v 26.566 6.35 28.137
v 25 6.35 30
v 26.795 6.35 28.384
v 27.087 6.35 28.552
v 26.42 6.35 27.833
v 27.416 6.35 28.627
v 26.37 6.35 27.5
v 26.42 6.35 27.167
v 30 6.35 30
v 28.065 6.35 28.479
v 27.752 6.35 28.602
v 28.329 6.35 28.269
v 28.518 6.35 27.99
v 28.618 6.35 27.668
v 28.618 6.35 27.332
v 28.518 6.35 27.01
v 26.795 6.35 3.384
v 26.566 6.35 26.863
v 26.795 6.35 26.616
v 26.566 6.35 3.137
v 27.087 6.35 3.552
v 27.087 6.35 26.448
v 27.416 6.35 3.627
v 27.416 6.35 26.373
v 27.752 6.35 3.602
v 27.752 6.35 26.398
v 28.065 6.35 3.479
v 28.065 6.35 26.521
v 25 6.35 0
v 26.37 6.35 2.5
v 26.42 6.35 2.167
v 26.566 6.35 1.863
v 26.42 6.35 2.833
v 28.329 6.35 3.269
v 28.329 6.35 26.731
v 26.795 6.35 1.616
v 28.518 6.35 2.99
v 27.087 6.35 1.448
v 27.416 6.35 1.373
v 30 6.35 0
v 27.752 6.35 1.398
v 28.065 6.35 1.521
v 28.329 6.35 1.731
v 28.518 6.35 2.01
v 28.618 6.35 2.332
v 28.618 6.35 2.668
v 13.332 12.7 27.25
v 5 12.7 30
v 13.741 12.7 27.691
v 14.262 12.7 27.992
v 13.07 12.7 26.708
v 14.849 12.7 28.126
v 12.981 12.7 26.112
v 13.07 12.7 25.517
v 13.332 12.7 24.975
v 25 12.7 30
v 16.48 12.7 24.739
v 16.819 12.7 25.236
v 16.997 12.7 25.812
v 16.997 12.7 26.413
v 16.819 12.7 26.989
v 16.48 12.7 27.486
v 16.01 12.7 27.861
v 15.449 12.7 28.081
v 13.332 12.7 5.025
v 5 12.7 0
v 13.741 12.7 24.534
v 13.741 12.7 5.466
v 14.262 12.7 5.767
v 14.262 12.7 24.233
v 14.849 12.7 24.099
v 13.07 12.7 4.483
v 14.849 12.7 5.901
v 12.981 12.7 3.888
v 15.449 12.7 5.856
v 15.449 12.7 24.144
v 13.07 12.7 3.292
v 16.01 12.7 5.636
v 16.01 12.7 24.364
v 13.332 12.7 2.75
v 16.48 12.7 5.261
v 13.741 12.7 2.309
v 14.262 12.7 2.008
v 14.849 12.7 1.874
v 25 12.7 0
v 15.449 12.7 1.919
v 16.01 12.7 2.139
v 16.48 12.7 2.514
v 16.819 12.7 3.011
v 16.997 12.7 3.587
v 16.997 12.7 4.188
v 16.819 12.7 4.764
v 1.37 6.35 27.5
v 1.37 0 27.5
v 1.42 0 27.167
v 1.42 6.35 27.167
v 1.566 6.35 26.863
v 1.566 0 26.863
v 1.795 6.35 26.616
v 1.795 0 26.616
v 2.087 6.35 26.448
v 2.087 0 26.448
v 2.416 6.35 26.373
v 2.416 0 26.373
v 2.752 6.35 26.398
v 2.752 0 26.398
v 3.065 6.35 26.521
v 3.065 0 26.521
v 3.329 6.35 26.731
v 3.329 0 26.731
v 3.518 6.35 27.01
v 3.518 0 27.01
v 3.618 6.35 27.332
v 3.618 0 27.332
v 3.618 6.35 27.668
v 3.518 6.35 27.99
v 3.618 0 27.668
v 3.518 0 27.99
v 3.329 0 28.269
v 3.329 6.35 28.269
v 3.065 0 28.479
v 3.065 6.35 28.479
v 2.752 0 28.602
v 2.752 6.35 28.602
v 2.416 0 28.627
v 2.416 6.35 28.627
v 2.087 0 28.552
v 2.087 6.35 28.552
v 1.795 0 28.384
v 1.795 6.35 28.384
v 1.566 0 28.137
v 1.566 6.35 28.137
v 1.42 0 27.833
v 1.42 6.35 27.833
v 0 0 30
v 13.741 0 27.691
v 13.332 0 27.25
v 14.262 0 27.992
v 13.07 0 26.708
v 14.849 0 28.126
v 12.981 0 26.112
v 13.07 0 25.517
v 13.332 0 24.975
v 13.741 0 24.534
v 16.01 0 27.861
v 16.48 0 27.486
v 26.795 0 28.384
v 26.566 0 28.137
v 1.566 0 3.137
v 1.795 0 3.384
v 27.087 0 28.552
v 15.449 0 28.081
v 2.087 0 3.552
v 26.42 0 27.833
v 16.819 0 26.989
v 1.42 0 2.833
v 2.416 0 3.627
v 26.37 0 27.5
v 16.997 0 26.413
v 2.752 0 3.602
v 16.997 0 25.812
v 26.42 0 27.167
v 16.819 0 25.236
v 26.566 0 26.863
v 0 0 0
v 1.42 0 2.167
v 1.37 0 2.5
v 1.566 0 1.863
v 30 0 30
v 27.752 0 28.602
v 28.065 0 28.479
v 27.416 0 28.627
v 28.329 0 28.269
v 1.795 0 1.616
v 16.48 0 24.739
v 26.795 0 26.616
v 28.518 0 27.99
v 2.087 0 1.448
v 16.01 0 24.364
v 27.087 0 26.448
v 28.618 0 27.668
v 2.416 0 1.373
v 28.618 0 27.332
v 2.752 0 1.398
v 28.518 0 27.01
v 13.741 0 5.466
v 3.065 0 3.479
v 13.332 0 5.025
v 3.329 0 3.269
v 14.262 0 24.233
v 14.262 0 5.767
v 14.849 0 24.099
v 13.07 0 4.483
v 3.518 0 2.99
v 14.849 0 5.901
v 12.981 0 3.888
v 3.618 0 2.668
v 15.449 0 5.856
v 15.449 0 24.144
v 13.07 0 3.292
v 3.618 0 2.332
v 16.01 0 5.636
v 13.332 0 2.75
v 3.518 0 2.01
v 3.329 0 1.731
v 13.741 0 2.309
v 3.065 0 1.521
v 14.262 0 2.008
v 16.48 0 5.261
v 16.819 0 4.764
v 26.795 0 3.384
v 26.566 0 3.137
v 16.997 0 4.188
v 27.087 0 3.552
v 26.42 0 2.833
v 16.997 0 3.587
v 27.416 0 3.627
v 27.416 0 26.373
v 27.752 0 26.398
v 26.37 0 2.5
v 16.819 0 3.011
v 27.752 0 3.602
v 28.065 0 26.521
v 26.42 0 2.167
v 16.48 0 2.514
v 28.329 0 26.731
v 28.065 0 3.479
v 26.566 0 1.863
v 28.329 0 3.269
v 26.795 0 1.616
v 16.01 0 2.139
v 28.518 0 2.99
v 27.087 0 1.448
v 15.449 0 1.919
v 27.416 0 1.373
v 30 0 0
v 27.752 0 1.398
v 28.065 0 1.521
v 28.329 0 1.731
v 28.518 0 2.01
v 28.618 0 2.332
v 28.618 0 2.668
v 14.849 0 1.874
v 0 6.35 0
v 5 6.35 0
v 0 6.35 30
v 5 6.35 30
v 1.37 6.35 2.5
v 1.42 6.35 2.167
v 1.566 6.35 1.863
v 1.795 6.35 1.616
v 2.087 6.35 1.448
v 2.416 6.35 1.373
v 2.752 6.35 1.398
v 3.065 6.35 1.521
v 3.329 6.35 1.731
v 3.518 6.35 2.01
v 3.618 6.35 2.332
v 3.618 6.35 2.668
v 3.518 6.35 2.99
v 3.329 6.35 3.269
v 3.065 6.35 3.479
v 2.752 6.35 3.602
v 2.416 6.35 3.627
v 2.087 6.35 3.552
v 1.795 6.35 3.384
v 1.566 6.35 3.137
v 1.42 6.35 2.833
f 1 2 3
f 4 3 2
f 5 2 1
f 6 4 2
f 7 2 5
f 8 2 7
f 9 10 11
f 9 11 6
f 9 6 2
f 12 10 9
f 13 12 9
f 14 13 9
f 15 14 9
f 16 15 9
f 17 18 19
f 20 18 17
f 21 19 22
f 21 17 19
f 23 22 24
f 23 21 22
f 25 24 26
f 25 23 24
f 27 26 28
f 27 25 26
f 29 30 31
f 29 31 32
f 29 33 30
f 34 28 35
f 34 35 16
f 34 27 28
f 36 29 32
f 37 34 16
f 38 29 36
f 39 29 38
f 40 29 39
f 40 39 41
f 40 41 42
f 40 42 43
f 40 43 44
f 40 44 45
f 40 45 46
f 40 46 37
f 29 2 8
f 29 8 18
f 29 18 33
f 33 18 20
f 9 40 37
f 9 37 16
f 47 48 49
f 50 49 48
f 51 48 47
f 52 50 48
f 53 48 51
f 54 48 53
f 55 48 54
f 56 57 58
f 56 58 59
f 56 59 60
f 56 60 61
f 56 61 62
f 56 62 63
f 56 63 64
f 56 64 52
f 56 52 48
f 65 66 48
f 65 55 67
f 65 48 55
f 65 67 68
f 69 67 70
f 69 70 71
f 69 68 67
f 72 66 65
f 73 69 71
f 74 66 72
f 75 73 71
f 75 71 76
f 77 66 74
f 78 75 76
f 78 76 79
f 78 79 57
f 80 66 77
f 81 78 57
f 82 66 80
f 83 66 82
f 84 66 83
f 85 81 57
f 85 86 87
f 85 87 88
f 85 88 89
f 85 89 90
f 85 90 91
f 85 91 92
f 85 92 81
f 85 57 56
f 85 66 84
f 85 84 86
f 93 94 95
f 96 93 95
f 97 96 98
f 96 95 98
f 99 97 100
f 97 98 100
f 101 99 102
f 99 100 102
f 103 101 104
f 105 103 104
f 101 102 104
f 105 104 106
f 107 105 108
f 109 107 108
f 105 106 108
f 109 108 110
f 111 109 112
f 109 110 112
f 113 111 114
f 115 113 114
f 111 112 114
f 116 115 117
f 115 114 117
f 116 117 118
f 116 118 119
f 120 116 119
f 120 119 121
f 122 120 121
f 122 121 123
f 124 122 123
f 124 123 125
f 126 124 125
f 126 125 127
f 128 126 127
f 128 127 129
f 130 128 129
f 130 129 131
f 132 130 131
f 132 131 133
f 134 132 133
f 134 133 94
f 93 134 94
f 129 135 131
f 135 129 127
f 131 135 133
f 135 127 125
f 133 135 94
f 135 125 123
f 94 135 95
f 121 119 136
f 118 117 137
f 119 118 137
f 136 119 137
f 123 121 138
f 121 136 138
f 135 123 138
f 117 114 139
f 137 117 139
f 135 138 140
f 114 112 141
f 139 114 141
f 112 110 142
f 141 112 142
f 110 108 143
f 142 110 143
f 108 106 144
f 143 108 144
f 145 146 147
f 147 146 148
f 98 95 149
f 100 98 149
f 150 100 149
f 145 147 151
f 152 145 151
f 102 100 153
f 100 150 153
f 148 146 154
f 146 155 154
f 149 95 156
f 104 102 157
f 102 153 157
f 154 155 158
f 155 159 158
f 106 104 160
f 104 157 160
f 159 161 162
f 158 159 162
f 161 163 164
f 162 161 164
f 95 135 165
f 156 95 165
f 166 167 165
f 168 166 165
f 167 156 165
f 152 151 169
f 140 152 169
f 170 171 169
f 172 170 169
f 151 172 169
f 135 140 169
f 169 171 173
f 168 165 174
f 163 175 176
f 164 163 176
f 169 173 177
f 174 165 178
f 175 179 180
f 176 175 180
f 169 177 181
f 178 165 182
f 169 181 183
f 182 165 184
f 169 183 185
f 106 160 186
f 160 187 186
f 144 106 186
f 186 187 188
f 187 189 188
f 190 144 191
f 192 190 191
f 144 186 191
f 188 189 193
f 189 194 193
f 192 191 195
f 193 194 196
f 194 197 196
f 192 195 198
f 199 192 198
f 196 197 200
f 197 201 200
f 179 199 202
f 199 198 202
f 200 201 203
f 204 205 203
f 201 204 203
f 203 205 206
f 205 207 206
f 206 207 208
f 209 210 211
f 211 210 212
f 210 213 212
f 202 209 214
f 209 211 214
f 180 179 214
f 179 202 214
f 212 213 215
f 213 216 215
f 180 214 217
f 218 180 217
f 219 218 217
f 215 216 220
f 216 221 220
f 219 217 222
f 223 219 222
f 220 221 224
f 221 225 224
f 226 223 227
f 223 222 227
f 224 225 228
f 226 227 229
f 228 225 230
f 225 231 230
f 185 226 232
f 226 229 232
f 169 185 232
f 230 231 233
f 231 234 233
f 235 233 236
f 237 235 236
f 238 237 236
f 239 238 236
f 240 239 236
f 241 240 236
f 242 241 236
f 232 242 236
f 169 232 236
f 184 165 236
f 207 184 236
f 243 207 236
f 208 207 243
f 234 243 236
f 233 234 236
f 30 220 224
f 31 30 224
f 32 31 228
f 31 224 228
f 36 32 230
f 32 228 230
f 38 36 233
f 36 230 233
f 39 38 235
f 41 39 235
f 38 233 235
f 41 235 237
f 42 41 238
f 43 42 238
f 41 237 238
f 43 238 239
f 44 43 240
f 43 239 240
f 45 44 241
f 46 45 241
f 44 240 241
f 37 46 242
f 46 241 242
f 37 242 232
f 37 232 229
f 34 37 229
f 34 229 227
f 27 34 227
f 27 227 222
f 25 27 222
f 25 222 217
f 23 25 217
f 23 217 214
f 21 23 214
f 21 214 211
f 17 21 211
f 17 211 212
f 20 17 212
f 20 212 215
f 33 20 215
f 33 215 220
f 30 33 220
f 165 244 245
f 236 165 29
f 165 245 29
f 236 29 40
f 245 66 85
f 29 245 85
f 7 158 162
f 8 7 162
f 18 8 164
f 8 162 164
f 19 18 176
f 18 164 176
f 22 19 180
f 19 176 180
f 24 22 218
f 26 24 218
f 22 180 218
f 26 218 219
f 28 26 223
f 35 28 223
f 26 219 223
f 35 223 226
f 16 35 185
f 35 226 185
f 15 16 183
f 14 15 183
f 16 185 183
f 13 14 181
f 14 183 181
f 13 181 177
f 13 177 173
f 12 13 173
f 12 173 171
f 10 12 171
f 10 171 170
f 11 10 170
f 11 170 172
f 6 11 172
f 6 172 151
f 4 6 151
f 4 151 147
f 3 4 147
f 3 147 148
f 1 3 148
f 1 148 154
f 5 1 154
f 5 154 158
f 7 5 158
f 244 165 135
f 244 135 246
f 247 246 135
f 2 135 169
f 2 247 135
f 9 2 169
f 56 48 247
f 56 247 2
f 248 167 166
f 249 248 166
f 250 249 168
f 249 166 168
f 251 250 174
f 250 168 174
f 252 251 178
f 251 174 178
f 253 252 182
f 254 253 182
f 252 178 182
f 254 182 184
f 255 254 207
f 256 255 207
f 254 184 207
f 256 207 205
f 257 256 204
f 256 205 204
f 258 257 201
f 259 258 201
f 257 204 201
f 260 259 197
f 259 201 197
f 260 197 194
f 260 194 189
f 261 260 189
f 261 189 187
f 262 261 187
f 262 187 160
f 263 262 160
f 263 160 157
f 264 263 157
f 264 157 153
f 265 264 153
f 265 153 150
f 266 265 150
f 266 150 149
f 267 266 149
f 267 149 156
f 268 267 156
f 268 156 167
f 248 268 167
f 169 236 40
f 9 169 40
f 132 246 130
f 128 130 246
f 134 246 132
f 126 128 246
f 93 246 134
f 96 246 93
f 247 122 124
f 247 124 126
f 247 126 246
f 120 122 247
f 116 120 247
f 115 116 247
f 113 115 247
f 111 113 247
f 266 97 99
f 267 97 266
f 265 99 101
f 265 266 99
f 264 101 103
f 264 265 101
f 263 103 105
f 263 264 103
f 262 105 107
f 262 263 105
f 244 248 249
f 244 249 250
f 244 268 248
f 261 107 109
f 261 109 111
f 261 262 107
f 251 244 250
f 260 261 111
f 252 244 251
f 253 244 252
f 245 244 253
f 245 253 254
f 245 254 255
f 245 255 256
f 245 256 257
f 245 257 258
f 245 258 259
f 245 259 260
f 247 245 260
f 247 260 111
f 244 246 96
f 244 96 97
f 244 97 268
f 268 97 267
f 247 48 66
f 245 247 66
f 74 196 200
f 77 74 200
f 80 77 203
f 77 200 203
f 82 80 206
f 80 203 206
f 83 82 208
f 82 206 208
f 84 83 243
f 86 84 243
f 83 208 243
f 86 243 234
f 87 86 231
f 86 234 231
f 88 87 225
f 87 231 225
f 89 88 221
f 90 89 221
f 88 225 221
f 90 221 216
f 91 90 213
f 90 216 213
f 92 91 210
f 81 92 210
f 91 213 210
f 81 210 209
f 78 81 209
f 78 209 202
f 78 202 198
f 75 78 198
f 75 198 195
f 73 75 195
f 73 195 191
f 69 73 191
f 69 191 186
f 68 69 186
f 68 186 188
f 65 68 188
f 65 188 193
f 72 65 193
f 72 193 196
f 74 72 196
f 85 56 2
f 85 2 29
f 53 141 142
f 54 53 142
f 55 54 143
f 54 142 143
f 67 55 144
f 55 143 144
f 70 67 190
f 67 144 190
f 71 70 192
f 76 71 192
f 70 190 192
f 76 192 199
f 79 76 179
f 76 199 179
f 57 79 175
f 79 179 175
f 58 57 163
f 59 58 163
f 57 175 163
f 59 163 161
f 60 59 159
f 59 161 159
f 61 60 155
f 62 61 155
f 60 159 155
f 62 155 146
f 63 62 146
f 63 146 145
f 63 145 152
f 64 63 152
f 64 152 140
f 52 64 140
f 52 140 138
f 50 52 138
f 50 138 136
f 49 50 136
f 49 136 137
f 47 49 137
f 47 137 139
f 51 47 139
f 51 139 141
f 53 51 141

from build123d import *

# Parameters (mm, degrees)
SKETCH1_W              = 30
SKETCH1_H              = 12.7
BOSS_EXTRUDE1_DEPTH    = 30
F_2_CLEARANCE_HOLE1_D  = 2.2606
SKETCH4_OUTSIDE_W      = 40.858
SKETCH4_OUTSIDE_H      = 40.858
SKETCH4_OUTSIDE_W_2    = 20
SKETCH4_OUTSIDE_H_2    = 30
CUT_EXTRUDE1_DEPTH     = 6.35
F_10_32_TAPPED_HOLE1_D = 4.0386


with BuildPart() as part:
    # Sketch1 → Boss-Extrude1 (new body)
    with BuildSketch(Plane.XY):
        with Locations((15, 6.35)):
            Rectangle(SKETCH1_W, SKETCH1_H)
    extrude(amount=BOSS_EXTRUDE1_DEPTH)

    # #2 Clearance Hole1 (through all)
    with Locations(Plane(origin=(0, 12.7, 0), x_dir=(1, 0, 0), z_dir=(0, 1, 0))):
        with Locations((2.5, -2.5), (27.5, -2.5), (27.5, -27.5), (2.5, -27.5)):
            Hole(F_2_CLEARANCE_HOLE1_D / 2)

    # Sketch4 outside → Cut-Extrude1 (cut)
    with BuildSketch(Plane(origin=(0, 12.7, 0), x_dir=(1, 0, 0), z_dir=(0, 1, 0))):
        with Locations((15, -15)):
            Rectangle(SKETCH4_OUTSIDE_W, SKETCH4_OUTSIDE_H)
        with Locations((15, -15)):
            Rectangle(SKETCH4_OUTSIDE_W_2, SKETCH4_OUTSIDE_H_2, mode=Mode.SUBTRACT)
    extrude(amount=-CUT_EXTRUDE1_DEPTH, mode=Mode.SUBTRACT)

    # #10-32 Tapped Hole1 (through all)
    with Locations(Plane(origin=(0, 12.7, 0), x_dir=(1, 0, 0), z_dir=(0, 1, 0))):
        with Locations((15, -3.8875), (15, -26.1125)):
            Hole(F_10_32_TAPPED_HOLE1_D / 2)


solid = part.part
